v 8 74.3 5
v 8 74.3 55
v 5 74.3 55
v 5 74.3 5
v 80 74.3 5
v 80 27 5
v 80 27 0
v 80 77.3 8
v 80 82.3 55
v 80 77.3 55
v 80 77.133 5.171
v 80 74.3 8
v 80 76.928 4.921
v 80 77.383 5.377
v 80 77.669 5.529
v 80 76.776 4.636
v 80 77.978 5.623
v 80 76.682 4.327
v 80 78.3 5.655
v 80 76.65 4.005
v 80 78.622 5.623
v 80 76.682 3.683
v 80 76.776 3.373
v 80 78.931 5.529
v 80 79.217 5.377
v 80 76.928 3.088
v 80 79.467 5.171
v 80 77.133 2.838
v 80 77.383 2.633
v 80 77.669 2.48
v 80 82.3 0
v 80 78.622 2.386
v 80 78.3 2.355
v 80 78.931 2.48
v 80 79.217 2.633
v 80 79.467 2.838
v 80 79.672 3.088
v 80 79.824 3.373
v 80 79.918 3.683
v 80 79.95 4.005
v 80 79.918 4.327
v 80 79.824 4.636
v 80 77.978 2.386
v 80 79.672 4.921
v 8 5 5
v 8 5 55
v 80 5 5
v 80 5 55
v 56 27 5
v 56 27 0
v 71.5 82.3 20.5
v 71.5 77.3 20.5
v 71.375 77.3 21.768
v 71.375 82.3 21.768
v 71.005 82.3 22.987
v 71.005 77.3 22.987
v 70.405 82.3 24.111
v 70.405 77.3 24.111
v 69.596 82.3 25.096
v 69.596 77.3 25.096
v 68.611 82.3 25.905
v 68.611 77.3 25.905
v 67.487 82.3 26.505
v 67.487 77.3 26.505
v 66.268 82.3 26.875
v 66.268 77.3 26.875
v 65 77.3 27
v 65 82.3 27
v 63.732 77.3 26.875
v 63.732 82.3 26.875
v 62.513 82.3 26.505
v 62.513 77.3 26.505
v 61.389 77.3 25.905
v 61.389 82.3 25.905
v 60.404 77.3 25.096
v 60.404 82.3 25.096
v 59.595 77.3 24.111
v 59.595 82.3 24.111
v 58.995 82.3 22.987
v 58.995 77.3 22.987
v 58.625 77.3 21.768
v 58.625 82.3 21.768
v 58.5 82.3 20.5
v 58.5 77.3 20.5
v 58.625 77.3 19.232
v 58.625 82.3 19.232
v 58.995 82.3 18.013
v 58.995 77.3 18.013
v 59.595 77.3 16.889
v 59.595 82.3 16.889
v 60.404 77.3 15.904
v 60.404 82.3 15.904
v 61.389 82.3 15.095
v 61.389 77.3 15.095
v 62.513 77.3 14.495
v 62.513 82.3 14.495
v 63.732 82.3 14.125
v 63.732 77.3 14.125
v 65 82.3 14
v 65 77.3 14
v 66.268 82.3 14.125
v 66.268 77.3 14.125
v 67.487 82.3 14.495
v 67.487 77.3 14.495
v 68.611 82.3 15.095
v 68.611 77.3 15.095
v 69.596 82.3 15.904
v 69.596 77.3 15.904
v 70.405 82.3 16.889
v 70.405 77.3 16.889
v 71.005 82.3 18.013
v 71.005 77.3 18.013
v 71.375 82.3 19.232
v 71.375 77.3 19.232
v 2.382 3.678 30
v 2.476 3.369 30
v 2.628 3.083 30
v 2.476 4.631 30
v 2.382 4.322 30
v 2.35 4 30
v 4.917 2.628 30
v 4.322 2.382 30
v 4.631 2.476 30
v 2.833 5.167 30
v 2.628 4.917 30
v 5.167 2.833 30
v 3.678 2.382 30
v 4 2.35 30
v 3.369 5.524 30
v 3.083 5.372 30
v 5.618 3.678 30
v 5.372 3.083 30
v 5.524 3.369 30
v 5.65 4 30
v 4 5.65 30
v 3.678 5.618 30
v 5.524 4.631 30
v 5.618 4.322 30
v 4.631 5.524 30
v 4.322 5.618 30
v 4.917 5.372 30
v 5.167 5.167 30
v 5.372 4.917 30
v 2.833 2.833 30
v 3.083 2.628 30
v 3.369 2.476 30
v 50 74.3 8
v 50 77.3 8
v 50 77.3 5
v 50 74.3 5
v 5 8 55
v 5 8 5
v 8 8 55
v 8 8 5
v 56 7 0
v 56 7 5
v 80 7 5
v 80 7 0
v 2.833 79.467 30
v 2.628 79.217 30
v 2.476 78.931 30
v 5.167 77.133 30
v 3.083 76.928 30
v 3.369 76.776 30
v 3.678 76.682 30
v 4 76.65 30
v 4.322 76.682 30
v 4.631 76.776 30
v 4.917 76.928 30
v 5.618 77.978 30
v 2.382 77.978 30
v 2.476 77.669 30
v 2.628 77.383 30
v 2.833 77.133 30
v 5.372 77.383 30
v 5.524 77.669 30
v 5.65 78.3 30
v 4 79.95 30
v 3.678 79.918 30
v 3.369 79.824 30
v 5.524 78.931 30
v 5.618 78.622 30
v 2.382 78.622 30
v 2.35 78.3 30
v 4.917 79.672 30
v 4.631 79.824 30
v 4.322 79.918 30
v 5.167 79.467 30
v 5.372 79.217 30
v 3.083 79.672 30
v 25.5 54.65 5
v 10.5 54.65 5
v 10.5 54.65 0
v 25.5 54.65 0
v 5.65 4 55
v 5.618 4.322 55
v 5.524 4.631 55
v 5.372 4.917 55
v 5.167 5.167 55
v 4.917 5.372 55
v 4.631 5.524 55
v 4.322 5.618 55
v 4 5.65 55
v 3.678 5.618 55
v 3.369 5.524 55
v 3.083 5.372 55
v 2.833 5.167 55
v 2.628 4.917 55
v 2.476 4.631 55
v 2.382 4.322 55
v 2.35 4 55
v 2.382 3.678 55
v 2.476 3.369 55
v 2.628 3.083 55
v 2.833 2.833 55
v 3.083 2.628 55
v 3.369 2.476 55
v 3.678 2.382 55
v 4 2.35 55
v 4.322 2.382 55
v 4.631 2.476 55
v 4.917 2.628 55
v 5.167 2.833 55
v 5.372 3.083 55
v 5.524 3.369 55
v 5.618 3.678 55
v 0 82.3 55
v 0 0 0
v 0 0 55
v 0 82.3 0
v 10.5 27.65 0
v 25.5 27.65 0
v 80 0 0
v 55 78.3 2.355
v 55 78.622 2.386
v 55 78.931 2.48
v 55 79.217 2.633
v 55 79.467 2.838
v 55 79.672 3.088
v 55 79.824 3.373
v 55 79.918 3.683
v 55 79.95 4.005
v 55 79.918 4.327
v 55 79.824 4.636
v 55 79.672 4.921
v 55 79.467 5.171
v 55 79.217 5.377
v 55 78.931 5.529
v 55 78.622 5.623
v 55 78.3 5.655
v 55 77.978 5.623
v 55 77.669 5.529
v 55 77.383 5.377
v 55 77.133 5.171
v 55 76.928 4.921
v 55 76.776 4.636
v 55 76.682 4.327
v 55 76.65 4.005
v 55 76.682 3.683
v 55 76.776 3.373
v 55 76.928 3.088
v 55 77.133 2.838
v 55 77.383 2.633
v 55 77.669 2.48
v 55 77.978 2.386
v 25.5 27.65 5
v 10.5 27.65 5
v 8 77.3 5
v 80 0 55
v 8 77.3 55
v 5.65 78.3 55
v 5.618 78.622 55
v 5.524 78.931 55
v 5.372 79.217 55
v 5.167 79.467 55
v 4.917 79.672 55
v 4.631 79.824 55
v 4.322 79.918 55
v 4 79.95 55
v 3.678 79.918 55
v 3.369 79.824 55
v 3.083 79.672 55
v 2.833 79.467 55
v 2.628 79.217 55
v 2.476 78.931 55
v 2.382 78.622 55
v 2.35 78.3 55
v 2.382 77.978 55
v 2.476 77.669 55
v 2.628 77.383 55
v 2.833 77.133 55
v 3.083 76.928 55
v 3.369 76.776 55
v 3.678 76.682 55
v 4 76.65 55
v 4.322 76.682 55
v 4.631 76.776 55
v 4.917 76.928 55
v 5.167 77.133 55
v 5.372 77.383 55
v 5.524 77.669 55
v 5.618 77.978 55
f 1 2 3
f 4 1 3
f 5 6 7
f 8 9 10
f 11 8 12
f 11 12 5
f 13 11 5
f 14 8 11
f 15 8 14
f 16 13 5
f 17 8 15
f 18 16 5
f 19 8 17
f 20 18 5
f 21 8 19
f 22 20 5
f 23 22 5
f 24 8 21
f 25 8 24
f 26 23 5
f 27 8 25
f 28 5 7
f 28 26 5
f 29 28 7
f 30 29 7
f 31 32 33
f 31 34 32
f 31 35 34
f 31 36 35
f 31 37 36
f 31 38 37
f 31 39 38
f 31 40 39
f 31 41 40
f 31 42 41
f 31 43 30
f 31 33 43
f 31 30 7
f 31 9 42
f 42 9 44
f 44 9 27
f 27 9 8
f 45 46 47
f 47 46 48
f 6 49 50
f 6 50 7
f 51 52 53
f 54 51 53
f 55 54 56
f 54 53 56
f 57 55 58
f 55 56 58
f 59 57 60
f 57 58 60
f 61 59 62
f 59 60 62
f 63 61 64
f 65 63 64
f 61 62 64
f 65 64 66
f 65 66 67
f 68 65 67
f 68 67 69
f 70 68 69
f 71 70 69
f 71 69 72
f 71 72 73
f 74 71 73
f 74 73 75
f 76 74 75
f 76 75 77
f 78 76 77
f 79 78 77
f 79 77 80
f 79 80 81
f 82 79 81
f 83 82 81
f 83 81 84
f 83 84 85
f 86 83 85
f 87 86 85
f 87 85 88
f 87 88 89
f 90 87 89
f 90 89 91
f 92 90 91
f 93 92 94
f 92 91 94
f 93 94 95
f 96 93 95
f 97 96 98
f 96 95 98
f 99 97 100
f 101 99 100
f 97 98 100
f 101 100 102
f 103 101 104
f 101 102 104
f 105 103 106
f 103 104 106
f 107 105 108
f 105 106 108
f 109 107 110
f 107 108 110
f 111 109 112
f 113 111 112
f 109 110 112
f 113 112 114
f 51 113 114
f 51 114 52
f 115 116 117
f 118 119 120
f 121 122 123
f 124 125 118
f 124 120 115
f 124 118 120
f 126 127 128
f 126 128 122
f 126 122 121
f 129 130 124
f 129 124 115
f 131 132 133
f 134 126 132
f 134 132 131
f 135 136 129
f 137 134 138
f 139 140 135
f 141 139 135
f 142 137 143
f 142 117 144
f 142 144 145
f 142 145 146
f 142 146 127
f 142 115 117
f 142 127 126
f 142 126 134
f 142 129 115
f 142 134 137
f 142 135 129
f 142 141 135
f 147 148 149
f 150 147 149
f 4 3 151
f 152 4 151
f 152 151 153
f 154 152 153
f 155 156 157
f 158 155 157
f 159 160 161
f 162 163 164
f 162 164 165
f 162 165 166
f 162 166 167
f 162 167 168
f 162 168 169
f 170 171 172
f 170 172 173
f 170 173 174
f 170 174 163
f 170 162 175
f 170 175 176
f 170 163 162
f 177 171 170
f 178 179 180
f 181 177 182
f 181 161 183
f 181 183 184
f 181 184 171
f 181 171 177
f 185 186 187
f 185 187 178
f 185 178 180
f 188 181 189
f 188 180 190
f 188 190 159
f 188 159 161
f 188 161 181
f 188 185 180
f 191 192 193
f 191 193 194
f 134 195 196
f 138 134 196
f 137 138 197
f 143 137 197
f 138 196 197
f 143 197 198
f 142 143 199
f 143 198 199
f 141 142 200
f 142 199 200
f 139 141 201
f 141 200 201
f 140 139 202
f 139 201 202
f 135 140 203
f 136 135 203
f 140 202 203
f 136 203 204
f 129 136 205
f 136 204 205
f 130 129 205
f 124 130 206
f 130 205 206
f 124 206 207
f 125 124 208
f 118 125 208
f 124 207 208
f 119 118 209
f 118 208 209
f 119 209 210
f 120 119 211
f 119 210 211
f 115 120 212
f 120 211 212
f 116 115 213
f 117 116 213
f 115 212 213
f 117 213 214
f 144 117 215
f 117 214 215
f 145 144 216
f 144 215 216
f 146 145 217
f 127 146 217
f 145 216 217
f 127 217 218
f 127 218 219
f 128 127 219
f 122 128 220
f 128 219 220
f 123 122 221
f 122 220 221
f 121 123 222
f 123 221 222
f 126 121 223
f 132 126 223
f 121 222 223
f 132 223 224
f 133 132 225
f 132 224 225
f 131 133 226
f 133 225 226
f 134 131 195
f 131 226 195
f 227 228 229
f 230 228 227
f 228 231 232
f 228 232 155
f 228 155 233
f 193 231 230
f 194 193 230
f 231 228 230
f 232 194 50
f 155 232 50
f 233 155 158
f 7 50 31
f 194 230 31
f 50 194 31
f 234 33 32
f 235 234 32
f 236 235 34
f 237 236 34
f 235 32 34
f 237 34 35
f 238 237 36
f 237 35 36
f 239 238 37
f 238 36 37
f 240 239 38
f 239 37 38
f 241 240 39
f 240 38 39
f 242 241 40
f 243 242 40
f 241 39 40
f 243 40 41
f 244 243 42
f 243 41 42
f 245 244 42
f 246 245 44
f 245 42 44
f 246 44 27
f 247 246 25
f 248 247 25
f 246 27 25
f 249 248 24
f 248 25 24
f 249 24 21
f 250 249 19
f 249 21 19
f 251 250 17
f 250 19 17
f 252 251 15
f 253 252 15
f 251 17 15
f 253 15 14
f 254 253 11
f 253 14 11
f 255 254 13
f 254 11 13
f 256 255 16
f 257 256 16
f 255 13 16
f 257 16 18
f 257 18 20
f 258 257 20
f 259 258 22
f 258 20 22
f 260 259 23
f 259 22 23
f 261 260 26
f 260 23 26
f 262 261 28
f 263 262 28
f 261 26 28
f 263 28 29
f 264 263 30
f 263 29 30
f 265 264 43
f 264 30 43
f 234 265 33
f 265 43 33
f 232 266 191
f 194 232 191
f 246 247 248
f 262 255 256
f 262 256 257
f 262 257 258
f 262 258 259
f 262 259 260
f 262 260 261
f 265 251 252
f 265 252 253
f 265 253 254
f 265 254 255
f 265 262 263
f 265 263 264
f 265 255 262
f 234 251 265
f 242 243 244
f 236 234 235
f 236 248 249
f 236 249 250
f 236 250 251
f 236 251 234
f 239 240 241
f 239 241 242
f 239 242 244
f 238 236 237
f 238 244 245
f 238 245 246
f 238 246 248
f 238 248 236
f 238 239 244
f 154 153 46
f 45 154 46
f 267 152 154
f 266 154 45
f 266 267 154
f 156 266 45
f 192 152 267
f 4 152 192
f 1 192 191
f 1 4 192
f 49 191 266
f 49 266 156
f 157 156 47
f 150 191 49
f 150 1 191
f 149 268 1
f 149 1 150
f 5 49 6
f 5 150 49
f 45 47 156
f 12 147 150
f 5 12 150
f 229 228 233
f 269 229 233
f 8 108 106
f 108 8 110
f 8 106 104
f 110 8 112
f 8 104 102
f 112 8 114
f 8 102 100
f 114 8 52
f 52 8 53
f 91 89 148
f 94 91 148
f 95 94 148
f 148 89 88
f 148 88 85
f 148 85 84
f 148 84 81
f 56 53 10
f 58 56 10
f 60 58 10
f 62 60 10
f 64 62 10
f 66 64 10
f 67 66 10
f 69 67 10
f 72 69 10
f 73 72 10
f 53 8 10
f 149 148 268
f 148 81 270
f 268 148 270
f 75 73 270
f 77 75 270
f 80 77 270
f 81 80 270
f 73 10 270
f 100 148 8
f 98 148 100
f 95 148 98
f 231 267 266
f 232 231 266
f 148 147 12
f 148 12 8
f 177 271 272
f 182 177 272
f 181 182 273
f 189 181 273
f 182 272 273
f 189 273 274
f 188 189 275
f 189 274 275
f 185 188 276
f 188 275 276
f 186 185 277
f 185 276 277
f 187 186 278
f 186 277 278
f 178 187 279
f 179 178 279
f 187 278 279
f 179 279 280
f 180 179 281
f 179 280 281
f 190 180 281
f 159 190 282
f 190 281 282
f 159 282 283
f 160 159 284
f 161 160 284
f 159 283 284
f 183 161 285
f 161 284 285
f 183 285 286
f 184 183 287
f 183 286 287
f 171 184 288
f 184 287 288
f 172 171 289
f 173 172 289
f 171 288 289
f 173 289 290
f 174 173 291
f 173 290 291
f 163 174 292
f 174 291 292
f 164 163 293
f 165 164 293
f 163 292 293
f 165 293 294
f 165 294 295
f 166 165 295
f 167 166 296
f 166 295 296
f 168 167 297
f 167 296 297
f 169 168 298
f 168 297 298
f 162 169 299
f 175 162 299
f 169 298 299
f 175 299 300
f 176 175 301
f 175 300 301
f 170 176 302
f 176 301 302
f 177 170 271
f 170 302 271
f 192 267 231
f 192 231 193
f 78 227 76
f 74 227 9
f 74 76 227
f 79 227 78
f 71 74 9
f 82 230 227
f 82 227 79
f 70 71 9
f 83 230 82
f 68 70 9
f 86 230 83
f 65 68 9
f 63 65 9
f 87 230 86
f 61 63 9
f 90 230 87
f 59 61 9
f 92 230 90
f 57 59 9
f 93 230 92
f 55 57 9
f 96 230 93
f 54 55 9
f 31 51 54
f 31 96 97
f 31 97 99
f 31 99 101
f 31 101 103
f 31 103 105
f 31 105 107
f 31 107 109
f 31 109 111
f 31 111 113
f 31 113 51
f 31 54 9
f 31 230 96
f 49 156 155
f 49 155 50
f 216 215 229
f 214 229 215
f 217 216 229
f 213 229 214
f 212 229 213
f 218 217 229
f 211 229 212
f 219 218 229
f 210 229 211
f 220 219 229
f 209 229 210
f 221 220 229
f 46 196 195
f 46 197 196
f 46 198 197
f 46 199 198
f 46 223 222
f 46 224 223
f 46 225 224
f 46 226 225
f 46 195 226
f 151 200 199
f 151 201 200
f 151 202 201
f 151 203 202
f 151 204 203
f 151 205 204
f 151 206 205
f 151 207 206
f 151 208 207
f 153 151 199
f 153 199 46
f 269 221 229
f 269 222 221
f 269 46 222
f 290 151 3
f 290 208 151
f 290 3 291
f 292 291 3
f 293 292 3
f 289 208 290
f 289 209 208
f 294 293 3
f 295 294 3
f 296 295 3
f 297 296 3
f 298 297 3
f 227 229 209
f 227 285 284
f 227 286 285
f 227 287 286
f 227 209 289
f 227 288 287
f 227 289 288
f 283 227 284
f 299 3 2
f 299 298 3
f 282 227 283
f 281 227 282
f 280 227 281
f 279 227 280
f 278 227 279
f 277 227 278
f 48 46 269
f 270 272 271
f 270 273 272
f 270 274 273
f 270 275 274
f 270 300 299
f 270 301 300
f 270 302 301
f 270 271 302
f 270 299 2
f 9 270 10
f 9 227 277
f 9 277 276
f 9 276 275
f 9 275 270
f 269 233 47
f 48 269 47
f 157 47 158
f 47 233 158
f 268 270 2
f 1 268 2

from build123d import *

# Parameters (mm, degrees)
SKETCH1_W           = 80
SKETCH1_H           = 82.3
BOSS_EXTRUDE1_DEPTH = 55
CUT_EXTRUDE1_DEPTH  = 50
SKETCH3_R           = 1.65
CUT_EXTRUDE2_DEPTH  = 25
SKETCH4_W           = 15
SKETCH4_H           = 27
SKETCH4_W_2         = 24
SKETCH4_H_2         = 20
CUT_EXTRUDE3_DEPTH  = 20
SKETCH6_R           = 6.5
CUT_EXTRUDE4_DEPTH  = 20
SKETCH7_W           = 3
SKETCH7_H           = 3
BOSS_EXTRUDE2_DEPTH = 30
SKETCH8_R           = 1.65
CUT_EXTRUDE5_DEPTH  = 25


with BuildPart() as part:
    # Sketch1 → Boss-Extrude1 (new body)
    with BuildSketch(Plane.XY):
        with Locations((40, 41.15)):
            Rectangle(SKETCH1_W, SKETCH1_H)
    extrude(amount=BOSS_EXTRUDE1_DEPTH)

    # Sketch2 → Cut-Extrude1 (cut)
    with BuildSketch(Plane.XY.offset(55)):
        Polygon((80, 5), (80, 77.3), (8, 77.3), (8, 74.3), (5, 74.3), (5, 8), (8, 8), (8, 5), align=None)
    extrude(amount=-CUT_EXTRUDE1_DEPTH, mode=Mode.SUBTRACT)

    # Sketch3 → Cut-Extrude2 (cut)
    with BuildSketch(Plane.XY.offset(55)):
        with Locations((4, 78.3)):
            Circle(SKETCH3_R)
        with Locations((4, 4)):
            Circle(SKETCH3_R)
    extrude(amount=-CUT_EXTRUDE2_DEPTH, mode=Mode.SUBTRACT)

    # Sketch4 → Cut-Extrude3 (cut)
    with BuildSketch(Plane.XY.offset(5)):
        with Locations((18, 41.15)):
            Rectangle(SKETCH4_W, SKETCH4_H)
        with Locations((68, 17)):
            Rectangle(SKETCH4_W_2, SKETCH4_H_2)
    extrude(amount=-CUT_EXTRUDE3_DEPTH, mode=Mode.SUBTRACT)

    # Sketch6 → Cut-Extrude4 (cut)
    with BuildSketch(Plane.XZ.offset(-77.3)):
        with Locations((65, 20.5)):
            Circle(SKETCH6_R)
    extrude(amount=-CUT_EXTRUDE4_DEPTH, mode=Mode.SUBTRACT)

    # Sketch7 → Boss-Extrude2 (add)
    with BuildSketch(Plane(origin=(80, 0, 0), x_dir=(0, 0, -1), z_dir=(1, 0, 0))):
        with Locations((-6.5, 75.8)):
            Rectangle(SKETCH7_W, SKETCH7_H)
    extrude(amount=-BOSS_EXTRUDE2_DEPTH)

    # Sketch8 → Cut-Extrude5 (cut)
    with BuildSketch(Plane(origin=(80, 0, 0), x_dir=(0, 0, -1), z_dir=(1, 0, 0))):
        with Locations((-4.004640203, 78.3)):
            Circle(SKETCH8_R)
    extrude(amount=-CUT_EXTRUDE5_DEPTH, mode=Mode.SUBTRACT)


solid = part.part
